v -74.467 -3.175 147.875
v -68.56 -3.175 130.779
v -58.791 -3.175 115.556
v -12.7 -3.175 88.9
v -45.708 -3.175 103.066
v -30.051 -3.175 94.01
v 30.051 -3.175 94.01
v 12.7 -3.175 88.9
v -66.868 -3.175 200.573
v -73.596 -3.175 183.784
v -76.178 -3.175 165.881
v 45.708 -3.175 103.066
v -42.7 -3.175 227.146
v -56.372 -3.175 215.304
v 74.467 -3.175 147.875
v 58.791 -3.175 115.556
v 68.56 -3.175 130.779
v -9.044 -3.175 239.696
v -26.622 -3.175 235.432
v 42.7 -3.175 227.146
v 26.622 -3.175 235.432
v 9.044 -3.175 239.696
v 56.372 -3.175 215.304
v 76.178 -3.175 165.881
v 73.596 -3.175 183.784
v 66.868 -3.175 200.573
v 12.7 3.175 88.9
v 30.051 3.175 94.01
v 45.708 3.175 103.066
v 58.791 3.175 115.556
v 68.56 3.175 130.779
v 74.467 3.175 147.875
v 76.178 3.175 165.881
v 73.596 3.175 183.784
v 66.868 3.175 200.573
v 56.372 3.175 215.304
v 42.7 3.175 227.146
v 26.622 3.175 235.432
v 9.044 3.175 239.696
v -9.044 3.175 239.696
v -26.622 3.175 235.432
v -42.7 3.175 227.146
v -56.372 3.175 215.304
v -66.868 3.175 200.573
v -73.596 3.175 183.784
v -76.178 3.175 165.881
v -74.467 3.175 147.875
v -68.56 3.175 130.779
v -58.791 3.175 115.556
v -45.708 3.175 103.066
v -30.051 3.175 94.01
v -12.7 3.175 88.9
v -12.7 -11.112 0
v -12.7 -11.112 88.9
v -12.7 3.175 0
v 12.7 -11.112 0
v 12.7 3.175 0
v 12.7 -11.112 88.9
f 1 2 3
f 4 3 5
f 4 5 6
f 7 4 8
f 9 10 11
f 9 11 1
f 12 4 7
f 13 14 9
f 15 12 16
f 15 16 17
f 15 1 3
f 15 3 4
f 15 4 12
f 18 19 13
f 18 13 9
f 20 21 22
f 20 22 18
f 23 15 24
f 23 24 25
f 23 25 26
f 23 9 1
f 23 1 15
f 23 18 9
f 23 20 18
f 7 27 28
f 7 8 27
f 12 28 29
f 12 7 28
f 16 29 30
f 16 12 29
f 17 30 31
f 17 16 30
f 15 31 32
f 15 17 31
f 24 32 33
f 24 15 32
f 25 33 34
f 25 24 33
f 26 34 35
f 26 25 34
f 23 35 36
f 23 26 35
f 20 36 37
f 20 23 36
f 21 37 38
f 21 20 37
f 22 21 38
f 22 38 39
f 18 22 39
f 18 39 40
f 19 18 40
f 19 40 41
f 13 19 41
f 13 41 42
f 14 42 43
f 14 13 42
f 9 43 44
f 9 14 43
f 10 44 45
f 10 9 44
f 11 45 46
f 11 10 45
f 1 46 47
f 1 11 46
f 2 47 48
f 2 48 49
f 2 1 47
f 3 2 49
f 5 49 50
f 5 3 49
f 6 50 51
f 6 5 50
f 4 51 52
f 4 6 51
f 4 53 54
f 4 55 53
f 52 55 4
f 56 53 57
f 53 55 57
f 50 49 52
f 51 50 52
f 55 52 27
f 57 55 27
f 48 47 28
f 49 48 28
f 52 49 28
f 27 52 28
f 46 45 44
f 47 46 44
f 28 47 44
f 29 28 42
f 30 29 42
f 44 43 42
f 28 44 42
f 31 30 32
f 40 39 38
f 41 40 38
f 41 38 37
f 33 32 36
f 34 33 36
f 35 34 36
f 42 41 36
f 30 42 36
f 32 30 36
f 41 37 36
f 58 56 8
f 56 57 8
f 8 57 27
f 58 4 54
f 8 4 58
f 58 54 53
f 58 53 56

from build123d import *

# Parameters (mm, degrees)
F1_DEPTH = 3.175
F2_W     = 25.4
F2_H     = 88.9
F3_DEPTH = 7.9375


with BuildPart() as f1:
    # F0 (on Front) → F1 (new body, symmetric)
    with BuildSketch(Plane.XZ):
        with BuildLine():
            Line((-12.7, 88.9), (-12.7, 0))
            Line((-12.7, 0), (12.7, 0))
            Line((12.7, 0), (12.7, 88.9))
            ThreePointArc((12.7, 88.9), (0, 240.234213), (-12.7, 88.9))
        make_face()
    extrude(amount=F1_DEPTH, both=True)

    # F2 (on face) → F3 (join)
    with BuildSketch(Plane.XZ.offset(3.175)):
        with Locations((0, 44.45)):
            Rectangle(F2_W, F2_H)
    extrude(amount=F3_DEPTH)


solid = f1.part
